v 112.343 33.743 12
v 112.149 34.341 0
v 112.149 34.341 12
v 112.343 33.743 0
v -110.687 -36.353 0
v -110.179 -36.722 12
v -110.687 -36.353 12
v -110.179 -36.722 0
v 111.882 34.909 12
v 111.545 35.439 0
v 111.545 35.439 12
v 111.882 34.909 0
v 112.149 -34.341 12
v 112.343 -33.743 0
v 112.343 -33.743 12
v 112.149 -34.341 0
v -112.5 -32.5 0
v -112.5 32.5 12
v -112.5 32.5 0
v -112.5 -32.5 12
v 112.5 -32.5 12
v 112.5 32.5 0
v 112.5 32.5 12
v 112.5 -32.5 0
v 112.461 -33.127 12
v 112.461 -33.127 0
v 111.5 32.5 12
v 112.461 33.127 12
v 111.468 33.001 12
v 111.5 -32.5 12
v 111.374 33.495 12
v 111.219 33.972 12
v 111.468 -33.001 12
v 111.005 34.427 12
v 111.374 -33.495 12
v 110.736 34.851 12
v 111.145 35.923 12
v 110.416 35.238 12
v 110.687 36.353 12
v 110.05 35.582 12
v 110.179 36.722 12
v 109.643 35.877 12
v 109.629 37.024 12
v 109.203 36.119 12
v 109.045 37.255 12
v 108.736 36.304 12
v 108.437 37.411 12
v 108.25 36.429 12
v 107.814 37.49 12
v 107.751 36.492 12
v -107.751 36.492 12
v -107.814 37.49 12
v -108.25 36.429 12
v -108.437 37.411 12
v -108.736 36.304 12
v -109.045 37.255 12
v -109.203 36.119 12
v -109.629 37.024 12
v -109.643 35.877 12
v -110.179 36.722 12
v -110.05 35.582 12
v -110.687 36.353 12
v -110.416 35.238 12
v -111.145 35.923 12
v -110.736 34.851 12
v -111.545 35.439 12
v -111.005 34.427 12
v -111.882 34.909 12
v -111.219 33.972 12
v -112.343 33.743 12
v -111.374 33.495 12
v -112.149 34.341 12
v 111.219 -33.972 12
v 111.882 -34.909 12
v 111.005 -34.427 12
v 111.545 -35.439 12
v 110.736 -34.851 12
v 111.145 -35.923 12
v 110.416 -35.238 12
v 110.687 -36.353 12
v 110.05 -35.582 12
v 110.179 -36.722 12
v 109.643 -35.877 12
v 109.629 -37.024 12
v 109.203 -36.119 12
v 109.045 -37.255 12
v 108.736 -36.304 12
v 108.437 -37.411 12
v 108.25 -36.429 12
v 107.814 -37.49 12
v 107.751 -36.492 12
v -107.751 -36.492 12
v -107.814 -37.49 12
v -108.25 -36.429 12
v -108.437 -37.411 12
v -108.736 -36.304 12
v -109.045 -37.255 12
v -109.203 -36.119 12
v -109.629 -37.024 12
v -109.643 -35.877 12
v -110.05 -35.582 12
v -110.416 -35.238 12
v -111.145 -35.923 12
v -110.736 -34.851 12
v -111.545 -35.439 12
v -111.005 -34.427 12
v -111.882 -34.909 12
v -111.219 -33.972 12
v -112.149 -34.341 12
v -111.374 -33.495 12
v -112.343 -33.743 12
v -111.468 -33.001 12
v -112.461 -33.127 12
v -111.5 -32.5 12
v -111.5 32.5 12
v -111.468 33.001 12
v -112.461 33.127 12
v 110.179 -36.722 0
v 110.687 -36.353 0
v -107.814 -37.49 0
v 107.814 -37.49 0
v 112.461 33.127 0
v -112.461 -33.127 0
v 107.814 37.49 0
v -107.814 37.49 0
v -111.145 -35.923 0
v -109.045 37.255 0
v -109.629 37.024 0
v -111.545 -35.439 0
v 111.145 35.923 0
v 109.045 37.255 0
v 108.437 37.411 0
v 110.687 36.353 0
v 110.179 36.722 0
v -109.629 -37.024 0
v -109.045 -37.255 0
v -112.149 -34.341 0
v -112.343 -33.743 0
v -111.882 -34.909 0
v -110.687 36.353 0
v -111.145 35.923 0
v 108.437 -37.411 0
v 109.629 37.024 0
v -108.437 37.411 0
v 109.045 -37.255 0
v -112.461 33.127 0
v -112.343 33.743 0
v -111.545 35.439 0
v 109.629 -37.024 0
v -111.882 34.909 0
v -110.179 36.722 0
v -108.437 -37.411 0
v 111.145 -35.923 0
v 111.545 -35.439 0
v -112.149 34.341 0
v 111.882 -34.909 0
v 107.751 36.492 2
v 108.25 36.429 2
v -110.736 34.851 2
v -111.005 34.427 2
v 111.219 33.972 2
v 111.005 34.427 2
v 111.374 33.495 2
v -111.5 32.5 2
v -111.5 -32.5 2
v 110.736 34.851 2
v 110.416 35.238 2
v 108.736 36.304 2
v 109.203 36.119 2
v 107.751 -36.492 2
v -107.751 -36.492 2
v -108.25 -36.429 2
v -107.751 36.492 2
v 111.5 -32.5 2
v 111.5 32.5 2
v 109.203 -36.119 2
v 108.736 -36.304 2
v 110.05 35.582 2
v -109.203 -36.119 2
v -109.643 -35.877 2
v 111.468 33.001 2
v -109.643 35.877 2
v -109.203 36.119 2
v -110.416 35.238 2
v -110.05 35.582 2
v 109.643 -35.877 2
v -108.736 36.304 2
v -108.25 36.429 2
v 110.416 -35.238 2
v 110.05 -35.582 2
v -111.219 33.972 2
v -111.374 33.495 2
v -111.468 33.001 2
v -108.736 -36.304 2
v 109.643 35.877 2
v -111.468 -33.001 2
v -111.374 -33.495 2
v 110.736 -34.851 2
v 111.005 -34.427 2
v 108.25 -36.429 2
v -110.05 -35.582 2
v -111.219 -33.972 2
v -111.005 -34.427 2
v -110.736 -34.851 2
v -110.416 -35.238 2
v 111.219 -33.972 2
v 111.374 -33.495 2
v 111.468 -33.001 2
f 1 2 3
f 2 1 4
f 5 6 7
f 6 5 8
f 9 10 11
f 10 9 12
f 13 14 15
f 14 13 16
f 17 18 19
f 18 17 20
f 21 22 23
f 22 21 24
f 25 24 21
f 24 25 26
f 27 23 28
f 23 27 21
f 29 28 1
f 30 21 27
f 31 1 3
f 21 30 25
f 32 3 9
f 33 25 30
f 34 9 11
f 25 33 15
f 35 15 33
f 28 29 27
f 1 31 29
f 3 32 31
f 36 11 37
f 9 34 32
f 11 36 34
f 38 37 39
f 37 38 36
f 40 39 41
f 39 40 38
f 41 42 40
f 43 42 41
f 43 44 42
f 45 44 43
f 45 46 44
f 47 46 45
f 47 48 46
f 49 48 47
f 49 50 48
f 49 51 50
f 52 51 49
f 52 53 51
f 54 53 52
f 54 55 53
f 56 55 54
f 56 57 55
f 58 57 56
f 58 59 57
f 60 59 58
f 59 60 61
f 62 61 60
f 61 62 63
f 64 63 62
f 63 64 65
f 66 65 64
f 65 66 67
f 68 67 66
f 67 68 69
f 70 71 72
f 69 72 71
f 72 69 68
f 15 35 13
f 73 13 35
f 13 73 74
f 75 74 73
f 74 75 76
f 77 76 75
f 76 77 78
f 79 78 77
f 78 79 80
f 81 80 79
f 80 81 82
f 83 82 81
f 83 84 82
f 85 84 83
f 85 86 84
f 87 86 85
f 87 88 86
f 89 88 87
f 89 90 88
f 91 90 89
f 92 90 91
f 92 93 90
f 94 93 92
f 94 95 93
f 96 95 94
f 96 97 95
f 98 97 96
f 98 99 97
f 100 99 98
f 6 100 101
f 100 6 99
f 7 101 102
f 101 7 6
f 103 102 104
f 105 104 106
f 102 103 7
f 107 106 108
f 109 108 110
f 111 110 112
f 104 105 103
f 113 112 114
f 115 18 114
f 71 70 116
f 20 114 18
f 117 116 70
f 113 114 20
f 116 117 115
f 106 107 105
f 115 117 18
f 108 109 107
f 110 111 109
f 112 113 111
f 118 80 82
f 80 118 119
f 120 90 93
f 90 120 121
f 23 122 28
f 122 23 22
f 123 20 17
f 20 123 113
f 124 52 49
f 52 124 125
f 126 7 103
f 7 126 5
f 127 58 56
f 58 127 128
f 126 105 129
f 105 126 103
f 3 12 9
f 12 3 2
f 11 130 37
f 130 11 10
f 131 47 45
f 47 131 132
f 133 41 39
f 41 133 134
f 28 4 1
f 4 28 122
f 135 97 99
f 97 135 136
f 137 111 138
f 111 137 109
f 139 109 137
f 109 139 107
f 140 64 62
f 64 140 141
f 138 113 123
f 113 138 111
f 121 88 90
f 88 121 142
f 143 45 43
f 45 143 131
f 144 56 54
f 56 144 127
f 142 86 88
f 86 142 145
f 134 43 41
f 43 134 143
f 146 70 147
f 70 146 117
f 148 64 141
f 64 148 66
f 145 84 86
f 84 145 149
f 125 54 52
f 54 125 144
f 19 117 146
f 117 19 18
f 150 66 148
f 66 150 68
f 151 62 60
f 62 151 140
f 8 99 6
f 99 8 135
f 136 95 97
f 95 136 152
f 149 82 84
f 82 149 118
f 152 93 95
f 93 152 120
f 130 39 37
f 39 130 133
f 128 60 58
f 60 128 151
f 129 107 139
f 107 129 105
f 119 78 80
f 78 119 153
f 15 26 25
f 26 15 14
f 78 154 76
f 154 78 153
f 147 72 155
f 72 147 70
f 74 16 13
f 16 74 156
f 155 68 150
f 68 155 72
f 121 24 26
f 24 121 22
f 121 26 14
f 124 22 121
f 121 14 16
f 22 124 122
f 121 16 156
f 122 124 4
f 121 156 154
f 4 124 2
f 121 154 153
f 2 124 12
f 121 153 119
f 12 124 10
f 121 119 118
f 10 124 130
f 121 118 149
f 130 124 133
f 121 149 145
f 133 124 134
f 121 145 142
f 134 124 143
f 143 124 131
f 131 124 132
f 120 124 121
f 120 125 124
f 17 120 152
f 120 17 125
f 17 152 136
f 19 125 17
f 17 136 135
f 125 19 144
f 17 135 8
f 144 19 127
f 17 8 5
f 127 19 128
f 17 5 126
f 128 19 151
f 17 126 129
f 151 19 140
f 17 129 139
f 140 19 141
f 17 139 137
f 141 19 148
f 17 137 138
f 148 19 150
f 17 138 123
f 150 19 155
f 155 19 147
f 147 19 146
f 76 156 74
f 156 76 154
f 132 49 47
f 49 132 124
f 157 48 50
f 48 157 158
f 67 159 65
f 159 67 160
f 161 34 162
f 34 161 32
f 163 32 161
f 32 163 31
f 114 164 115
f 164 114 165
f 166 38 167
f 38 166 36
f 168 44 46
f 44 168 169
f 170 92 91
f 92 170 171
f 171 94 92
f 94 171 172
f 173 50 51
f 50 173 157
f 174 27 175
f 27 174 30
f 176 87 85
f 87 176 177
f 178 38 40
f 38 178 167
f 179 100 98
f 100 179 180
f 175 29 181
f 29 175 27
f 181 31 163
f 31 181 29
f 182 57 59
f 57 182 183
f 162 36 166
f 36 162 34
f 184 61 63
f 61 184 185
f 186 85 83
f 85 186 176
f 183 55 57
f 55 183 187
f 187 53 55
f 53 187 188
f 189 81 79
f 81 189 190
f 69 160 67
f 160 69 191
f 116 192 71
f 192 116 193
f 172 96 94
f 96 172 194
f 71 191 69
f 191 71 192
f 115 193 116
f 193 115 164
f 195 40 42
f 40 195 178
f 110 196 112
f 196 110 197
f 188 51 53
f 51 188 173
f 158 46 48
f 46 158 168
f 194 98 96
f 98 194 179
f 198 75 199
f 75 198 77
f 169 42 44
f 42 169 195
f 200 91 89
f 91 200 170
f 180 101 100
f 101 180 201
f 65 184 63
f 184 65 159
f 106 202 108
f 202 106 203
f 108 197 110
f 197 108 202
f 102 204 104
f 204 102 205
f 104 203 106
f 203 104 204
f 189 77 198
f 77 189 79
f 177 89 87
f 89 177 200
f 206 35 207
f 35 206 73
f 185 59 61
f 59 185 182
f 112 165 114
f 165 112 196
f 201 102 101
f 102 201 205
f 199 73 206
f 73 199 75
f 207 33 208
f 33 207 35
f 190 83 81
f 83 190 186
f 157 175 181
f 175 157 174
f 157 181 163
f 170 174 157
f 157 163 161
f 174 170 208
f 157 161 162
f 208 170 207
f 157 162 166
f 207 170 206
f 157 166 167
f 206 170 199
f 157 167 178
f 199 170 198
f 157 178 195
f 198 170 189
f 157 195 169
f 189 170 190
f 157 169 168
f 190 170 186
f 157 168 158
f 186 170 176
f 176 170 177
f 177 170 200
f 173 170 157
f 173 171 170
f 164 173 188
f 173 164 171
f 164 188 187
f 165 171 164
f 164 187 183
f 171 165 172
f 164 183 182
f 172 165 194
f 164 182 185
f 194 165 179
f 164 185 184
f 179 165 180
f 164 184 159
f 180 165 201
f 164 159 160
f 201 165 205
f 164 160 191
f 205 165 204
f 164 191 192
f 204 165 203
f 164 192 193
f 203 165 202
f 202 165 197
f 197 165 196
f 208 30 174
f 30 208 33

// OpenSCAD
$fn = 50;


difference() {
	union() {
		hull() {
			translate(v = [-107.5000000000, 32.5000000000, 0]) {
				cylinder(h = 12, r = 5);
			}
			translate(v = [107.5000000000, 32.5000000000, 0]) {
				cylinder(h = 12, r = 5);
			}
			translate(v = [-107.5000000000, -32.5000000000, 0]) {
				cylinder(h = 12, r = 5);
			}
			translate(v = [107.5000000000, -32.5000000000, 0]) {
				cylinder(h = 12, r = 5);
			}
		}
	}
	union() {
		translate(v = [0, 0, 2]) {
			hull() {
				translate(v = [-107.5000000000, 32.5000000000, 0]) {
					cylinder(h = 10, r = 4);
				}
				translate(v = [107.5000000000, 32.5000000000, 0]) {
					cylinder(h = 10, r = 4);
				}
				translate(v = [-107.5000000000, -32.5000000000, 0]) {
					cylinder(h = 10, r = 4);
				}
				translate(v = [107.5000000000, -32.5000000000, 0]) {
					cylinder(h = 10, r = 4);
				}
			}
		}
	}
}
